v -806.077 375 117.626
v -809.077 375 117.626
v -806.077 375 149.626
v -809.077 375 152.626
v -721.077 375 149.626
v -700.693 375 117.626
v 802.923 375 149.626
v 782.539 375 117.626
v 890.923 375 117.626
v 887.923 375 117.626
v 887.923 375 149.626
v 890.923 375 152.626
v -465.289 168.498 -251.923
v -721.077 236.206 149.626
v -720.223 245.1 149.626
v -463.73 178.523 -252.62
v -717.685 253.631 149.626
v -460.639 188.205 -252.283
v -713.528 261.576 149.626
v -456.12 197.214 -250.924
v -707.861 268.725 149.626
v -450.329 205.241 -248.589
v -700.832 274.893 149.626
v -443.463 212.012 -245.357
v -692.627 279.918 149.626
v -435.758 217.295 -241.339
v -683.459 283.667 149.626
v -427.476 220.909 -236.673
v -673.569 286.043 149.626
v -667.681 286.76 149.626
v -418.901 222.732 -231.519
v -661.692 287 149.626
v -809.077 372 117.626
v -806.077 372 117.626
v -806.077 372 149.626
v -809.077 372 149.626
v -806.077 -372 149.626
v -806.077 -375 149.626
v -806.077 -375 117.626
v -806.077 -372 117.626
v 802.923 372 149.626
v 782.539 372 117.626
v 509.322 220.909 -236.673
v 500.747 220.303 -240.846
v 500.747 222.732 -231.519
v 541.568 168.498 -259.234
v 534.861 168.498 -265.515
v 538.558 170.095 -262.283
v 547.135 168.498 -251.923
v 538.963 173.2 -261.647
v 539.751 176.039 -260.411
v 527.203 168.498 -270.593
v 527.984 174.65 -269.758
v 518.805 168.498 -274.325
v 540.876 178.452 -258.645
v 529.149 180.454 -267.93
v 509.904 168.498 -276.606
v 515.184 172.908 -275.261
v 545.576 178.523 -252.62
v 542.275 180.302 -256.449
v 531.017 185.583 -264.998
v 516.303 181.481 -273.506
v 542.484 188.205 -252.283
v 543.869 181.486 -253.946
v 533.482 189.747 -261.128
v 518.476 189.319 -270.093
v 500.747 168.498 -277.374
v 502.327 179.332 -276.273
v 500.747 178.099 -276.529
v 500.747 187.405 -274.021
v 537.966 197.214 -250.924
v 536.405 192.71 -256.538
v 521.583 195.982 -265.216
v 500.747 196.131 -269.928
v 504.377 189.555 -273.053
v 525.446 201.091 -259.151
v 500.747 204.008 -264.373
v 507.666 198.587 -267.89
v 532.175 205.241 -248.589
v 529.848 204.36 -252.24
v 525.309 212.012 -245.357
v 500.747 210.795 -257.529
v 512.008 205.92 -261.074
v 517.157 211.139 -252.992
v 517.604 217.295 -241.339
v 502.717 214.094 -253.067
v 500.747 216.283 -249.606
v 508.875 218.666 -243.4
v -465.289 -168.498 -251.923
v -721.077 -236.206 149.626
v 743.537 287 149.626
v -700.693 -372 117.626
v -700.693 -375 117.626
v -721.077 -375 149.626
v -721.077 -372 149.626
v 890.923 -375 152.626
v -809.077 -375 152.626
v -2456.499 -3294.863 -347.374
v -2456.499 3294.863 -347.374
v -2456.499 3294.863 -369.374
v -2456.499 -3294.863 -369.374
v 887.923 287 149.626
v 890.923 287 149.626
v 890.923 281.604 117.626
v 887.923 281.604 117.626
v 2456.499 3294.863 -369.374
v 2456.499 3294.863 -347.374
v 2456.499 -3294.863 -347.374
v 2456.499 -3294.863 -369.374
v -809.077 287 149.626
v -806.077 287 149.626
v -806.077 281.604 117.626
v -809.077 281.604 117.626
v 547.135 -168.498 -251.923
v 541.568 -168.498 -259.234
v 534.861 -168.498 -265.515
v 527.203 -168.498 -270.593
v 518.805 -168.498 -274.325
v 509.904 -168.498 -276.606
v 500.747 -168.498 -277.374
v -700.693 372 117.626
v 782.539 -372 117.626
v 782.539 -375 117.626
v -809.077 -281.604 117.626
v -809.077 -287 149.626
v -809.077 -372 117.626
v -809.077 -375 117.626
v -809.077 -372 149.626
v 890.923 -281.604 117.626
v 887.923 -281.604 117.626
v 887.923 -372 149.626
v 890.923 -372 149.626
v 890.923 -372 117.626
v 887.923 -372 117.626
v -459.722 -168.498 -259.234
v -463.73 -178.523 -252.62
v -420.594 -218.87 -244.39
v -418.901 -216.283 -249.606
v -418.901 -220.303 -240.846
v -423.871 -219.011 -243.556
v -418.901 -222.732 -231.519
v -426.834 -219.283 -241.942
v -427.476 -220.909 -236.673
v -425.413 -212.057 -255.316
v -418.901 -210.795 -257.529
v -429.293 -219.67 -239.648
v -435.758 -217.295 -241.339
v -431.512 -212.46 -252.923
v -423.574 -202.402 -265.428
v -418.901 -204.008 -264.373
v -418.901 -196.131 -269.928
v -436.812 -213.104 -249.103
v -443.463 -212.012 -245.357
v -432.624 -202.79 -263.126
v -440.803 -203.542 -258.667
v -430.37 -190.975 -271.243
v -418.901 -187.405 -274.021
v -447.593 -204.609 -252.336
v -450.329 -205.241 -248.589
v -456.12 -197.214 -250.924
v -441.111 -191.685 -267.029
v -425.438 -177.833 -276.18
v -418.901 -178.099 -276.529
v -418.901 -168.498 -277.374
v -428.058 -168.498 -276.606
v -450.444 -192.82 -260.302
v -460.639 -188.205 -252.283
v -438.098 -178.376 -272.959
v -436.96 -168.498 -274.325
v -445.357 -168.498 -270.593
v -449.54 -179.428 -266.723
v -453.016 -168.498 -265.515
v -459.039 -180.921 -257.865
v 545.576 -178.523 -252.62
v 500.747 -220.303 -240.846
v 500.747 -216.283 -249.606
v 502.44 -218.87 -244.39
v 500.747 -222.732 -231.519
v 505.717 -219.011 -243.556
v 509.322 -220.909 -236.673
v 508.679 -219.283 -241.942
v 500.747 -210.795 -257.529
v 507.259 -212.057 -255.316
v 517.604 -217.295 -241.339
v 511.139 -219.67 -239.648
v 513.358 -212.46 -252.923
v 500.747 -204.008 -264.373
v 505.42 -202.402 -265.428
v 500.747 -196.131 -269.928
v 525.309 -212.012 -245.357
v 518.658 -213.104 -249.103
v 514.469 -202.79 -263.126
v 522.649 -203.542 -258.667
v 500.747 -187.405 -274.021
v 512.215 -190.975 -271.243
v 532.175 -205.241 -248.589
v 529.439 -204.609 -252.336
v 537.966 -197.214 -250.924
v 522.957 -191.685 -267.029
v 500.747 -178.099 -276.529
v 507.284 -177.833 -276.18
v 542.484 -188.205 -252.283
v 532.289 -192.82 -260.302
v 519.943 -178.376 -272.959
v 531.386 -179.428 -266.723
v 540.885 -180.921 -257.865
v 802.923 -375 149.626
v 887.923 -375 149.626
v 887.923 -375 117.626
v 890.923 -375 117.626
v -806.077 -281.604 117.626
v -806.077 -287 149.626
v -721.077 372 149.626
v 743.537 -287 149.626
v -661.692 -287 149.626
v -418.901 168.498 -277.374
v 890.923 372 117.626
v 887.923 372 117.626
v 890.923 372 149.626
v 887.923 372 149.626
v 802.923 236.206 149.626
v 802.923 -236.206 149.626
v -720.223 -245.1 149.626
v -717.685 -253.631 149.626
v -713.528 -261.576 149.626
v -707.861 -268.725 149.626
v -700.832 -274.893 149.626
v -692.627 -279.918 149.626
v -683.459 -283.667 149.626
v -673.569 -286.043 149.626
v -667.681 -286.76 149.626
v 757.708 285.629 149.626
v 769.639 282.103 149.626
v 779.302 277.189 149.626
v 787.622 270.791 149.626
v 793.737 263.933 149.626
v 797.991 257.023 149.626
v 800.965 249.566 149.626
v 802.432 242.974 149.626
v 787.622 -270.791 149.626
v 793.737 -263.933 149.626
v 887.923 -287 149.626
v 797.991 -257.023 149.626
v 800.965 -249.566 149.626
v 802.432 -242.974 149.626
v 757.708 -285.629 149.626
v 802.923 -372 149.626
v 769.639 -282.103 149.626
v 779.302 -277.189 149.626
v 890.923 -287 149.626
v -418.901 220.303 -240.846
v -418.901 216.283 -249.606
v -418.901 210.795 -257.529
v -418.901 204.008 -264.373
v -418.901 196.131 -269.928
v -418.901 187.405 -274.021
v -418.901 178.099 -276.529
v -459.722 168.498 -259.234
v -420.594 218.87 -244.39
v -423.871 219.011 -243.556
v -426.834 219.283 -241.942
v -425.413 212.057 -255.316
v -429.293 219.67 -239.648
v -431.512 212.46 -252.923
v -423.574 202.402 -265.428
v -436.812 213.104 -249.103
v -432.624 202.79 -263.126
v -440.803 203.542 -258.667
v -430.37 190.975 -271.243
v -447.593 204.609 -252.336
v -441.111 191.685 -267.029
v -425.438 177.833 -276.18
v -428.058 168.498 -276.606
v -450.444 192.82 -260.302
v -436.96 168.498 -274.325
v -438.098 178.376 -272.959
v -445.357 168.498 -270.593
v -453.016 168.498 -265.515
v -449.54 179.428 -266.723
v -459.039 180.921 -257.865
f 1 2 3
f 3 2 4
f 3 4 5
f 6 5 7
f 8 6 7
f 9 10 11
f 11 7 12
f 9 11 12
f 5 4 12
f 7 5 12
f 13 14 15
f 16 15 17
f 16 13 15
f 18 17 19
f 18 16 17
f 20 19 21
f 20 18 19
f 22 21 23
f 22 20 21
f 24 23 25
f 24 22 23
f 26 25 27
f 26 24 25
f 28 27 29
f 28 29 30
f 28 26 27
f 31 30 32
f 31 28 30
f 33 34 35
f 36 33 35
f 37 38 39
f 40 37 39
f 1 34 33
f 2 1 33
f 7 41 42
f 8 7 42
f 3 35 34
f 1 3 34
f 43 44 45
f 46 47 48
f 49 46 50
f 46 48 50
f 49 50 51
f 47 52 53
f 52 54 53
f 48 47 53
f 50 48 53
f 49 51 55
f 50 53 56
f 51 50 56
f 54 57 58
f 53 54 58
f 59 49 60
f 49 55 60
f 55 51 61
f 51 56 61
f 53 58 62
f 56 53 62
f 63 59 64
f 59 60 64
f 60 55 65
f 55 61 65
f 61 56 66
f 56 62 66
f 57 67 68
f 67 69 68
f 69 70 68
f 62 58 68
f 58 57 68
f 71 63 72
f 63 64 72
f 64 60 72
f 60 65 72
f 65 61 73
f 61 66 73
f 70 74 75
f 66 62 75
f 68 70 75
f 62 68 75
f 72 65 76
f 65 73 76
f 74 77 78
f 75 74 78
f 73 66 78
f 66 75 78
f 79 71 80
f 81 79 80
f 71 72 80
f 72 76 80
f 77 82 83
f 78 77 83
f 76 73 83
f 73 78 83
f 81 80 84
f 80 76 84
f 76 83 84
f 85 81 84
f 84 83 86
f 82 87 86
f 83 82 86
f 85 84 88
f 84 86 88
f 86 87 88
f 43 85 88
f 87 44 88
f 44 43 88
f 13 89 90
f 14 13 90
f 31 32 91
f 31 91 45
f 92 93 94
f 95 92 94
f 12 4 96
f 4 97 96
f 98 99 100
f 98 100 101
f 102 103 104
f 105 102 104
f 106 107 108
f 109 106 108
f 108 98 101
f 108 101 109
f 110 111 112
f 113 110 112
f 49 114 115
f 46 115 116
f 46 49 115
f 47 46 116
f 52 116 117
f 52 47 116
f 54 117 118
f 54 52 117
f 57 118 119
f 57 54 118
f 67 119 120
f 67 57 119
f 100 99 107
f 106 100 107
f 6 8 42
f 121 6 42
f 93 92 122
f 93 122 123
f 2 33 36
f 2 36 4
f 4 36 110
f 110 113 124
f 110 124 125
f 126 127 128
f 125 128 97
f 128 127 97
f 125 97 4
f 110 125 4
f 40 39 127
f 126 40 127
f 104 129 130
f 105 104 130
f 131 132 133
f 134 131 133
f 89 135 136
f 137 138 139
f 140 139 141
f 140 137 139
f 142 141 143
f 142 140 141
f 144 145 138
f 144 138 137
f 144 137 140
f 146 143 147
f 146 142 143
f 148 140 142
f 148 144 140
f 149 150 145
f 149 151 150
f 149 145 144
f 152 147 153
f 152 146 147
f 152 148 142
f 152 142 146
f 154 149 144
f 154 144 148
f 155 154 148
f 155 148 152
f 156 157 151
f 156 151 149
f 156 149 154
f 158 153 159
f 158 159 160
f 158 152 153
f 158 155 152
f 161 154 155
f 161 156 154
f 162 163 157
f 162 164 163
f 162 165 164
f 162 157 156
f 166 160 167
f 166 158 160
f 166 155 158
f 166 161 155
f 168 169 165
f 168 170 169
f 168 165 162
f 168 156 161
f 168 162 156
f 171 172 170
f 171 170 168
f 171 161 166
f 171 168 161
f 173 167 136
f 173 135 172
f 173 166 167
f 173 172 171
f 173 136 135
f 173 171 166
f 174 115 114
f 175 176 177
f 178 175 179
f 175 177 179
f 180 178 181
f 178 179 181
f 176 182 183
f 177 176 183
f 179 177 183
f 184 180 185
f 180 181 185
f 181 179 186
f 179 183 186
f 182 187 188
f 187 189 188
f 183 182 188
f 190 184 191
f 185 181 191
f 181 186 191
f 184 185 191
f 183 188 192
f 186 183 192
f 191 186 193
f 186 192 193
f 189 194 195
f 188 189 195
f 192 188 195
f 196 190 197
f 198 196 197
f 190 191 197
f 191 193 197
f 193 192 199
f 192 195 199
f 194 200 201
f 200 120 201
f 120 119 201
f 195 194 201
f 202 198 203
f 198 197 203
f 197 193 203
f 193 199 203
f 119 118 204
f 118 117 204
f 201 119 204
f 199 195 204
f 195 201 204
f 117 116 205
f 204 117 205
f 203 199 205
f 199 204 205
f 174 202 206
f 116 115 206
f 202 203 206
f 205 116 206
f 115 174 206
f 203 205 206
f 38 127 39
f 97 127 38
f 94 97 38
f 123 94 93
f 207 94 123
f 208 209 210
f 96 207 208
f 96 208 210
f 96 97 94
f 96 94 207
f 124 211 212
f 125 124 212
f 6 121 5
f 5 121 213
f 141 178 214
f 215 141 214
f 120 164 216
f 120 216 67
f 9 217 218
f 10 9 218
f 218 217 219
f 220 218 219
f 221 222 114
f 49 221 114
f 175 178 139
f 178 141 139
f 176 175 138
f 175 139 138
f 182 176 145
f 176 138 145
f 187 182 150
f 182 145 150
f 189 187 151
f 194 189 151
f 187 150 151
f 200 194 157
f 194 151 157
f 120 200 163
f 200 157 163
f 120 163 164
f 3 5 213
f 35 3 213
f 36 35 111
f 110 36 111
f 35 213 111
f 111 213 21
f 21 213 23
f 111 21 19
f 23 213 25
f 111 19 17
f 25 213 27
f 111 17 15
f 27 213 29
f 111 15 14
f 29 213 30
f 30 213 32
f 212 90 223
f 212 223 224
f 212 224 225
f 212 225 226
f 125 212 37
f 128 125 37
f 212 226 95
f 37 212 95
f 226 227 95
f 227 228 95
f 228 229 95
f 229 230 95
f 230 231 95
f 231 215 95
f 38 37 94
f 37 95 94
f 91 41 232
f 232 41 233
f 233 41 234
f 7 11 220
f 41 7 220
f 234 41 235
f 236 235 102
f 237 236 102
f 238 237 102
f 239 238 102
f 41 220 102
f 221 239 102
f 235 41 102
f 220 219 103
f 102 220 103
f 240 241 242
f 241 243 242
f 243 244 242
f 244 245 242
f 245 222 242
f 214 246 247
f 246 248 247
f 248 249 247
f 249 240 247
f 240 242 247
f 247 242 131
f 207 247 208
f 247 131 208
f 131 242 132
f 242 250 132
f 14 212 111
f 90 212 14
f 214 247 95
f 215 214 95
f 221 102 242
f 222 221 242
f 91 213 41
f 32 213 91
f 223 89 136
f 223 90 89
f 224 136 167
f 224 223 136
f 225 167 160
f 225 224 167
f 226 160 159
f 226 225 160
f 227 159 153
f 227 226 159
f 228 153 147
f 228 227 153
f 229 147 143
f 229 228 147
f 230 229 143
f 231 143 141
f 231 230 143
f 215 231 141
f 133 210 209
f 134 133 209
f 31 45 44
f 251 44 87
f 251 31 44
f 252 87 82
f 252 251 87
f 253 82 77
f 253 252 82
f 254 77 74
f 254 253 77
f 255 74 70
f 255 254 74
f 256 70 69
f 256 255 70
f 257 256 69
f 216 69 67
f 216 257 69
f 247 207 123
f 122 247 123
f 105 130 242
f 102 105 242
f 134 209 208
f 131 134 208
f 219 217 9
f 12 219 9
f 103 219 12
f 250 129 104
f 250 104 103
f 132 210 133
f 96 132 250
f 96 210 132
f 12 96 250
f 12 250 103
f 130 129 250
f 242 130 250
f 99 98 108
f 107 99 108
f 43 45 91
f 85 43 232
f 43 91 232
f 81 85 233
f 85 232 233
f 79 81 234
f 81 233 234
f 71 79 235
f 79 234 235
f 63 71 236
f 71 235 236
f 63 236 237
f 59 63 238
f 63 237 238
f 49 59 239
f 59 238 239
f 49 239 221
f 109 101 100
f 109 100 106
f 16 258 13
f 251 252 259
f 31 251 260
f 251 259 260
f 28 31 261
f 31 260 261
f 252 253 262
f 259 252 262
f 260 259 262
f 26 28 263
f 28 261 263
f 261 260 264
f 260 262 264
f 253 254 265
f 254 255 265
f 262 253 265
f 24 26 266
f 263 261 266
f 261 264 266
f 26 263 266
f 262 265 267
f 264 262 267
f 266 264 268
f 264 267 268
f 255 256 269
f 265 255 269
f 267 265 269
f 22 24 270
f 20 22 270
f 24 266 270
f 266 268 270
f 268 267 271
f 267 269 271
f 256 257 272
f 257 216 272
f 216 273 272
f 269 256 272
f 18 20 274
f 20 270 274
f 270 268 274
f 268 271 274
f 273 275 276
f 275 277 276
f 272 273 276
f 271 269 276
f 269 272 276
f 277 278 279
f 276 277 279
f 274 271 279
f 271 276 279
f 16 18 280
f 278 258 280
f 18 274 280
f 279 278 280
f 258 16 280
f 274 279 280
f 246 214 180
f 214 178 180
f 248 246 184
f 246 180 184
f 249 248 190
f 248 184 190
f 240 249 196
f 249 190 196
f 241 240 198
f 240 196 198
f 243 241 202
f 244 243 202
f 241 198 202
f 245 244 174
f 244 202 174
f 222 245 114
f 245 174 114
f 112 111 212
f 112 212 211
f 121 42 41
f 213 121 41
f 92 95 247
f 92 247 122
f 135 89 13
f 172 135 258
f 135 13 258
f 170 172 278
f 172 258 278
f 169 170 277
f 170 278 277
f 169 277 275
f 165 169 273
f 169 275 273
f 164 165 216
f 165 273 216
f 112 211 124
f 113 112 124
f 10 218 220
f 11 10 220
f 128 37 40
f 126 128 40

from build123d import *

# Parameters (mm, degrees)
F0_W          = 1700
F0_H          = 430
F1_DEPTH      = 375
F1_DEPTH_BACK = 375
F3_DEPTH      = 750.001
F5_DEPTH      = 1700.001
F6_R          = 55
F8_W          = 4912.9977226257
F8_H          = 6589.7264480591
F9_DEPTH      = 22


with BuildPart() as f1:
    # F0 (on Front) → F1 (new body, two sides)
    with BuildSketch(Plane.XZ) as f1_sk:
        with Locations((40.9229137003, -62.3736318606)):
            Rectangle(F0_W, F0_H)
    extrude(amount=F1_DEPTH)
    extrude(f1_sk.sketch, amount=-F1_DEPTH_BACK)

    # F2 (on face) → F3 (cut, through all)
    with BuildSketch(Plane.XZ.offset(375)):
        Polygon((-806.0770862997, 117.6263681394), (-809.0770862997, 117.6263681394), (-809.0770862997, -277.3736318606), (-449.0770862997, -277.3736318606), (-721.0770862997, 149.6263681394), (-806.0770862997, 149.6263681394), align=None)
        Polygon((802.9229137003, 149.6263681394), (530.9229137003, -277.3736318606), (890.9229137003, -277.3736318606), (890.9229137003, 117.6263681394), (887.9229137003, 117.6263681394), (887.9229137003, 149.6263681394), align=None)
    extrude(amount=-F3_DEPTH, mode=Mode.SUBTRACT)

    # F4 (on face) → F5 (cut, through all)
    with BuildSketch(Plane.YZ.offset(890.9229137003)):
        Polygon((-372, 117.6263681394), (-375, 117.6263681394), (-375, -277.3736318606), (-215, -277.3736318606), (-287, 149.6263681394), (-372, 149.6263681394), align=None)
        Polygon((375, -277.3736318606), (375, 117.6263681394), (372, 117.6263681394), (372, 149.6263681394), (287, 149.6263681394), (215, -277.3736318606), align=None)
    extrude(amount=-F5_DEPTH, mode=Mode.SUBTRACT)

    # F6
    f6_edges = [f1.edges().sort_by_distance(p)[0] for p in [
        (-449.077086, 0, -277.373632),
        (40.922914, 215, -277.373632),
        (530.922914, 0, -277.373632),
        (40.922914, -215, -277.373632),
        (-585.077086, -251, -63.873632),
        (-585.077086, 251, -63.873632),
        (666.922914, -251, -63.873632),
        (666.922914, 251, -63.873632),
    ]]
    fillet(f6_edges, radius=F6_R)


with BuildPart() as f9:
    # F8 (on offset) → F9 (new body)
    with BuildSketch(Plane(origin=(0, 0, -347.3736318606), x_dir=(1, 0, 0), z_dir=(0, 0, -1))):
        Rectangle(F8_W, F8_H)
    extrude(amount=F9_DEPTH)


solid = Compound([f1.part, f9.part])
